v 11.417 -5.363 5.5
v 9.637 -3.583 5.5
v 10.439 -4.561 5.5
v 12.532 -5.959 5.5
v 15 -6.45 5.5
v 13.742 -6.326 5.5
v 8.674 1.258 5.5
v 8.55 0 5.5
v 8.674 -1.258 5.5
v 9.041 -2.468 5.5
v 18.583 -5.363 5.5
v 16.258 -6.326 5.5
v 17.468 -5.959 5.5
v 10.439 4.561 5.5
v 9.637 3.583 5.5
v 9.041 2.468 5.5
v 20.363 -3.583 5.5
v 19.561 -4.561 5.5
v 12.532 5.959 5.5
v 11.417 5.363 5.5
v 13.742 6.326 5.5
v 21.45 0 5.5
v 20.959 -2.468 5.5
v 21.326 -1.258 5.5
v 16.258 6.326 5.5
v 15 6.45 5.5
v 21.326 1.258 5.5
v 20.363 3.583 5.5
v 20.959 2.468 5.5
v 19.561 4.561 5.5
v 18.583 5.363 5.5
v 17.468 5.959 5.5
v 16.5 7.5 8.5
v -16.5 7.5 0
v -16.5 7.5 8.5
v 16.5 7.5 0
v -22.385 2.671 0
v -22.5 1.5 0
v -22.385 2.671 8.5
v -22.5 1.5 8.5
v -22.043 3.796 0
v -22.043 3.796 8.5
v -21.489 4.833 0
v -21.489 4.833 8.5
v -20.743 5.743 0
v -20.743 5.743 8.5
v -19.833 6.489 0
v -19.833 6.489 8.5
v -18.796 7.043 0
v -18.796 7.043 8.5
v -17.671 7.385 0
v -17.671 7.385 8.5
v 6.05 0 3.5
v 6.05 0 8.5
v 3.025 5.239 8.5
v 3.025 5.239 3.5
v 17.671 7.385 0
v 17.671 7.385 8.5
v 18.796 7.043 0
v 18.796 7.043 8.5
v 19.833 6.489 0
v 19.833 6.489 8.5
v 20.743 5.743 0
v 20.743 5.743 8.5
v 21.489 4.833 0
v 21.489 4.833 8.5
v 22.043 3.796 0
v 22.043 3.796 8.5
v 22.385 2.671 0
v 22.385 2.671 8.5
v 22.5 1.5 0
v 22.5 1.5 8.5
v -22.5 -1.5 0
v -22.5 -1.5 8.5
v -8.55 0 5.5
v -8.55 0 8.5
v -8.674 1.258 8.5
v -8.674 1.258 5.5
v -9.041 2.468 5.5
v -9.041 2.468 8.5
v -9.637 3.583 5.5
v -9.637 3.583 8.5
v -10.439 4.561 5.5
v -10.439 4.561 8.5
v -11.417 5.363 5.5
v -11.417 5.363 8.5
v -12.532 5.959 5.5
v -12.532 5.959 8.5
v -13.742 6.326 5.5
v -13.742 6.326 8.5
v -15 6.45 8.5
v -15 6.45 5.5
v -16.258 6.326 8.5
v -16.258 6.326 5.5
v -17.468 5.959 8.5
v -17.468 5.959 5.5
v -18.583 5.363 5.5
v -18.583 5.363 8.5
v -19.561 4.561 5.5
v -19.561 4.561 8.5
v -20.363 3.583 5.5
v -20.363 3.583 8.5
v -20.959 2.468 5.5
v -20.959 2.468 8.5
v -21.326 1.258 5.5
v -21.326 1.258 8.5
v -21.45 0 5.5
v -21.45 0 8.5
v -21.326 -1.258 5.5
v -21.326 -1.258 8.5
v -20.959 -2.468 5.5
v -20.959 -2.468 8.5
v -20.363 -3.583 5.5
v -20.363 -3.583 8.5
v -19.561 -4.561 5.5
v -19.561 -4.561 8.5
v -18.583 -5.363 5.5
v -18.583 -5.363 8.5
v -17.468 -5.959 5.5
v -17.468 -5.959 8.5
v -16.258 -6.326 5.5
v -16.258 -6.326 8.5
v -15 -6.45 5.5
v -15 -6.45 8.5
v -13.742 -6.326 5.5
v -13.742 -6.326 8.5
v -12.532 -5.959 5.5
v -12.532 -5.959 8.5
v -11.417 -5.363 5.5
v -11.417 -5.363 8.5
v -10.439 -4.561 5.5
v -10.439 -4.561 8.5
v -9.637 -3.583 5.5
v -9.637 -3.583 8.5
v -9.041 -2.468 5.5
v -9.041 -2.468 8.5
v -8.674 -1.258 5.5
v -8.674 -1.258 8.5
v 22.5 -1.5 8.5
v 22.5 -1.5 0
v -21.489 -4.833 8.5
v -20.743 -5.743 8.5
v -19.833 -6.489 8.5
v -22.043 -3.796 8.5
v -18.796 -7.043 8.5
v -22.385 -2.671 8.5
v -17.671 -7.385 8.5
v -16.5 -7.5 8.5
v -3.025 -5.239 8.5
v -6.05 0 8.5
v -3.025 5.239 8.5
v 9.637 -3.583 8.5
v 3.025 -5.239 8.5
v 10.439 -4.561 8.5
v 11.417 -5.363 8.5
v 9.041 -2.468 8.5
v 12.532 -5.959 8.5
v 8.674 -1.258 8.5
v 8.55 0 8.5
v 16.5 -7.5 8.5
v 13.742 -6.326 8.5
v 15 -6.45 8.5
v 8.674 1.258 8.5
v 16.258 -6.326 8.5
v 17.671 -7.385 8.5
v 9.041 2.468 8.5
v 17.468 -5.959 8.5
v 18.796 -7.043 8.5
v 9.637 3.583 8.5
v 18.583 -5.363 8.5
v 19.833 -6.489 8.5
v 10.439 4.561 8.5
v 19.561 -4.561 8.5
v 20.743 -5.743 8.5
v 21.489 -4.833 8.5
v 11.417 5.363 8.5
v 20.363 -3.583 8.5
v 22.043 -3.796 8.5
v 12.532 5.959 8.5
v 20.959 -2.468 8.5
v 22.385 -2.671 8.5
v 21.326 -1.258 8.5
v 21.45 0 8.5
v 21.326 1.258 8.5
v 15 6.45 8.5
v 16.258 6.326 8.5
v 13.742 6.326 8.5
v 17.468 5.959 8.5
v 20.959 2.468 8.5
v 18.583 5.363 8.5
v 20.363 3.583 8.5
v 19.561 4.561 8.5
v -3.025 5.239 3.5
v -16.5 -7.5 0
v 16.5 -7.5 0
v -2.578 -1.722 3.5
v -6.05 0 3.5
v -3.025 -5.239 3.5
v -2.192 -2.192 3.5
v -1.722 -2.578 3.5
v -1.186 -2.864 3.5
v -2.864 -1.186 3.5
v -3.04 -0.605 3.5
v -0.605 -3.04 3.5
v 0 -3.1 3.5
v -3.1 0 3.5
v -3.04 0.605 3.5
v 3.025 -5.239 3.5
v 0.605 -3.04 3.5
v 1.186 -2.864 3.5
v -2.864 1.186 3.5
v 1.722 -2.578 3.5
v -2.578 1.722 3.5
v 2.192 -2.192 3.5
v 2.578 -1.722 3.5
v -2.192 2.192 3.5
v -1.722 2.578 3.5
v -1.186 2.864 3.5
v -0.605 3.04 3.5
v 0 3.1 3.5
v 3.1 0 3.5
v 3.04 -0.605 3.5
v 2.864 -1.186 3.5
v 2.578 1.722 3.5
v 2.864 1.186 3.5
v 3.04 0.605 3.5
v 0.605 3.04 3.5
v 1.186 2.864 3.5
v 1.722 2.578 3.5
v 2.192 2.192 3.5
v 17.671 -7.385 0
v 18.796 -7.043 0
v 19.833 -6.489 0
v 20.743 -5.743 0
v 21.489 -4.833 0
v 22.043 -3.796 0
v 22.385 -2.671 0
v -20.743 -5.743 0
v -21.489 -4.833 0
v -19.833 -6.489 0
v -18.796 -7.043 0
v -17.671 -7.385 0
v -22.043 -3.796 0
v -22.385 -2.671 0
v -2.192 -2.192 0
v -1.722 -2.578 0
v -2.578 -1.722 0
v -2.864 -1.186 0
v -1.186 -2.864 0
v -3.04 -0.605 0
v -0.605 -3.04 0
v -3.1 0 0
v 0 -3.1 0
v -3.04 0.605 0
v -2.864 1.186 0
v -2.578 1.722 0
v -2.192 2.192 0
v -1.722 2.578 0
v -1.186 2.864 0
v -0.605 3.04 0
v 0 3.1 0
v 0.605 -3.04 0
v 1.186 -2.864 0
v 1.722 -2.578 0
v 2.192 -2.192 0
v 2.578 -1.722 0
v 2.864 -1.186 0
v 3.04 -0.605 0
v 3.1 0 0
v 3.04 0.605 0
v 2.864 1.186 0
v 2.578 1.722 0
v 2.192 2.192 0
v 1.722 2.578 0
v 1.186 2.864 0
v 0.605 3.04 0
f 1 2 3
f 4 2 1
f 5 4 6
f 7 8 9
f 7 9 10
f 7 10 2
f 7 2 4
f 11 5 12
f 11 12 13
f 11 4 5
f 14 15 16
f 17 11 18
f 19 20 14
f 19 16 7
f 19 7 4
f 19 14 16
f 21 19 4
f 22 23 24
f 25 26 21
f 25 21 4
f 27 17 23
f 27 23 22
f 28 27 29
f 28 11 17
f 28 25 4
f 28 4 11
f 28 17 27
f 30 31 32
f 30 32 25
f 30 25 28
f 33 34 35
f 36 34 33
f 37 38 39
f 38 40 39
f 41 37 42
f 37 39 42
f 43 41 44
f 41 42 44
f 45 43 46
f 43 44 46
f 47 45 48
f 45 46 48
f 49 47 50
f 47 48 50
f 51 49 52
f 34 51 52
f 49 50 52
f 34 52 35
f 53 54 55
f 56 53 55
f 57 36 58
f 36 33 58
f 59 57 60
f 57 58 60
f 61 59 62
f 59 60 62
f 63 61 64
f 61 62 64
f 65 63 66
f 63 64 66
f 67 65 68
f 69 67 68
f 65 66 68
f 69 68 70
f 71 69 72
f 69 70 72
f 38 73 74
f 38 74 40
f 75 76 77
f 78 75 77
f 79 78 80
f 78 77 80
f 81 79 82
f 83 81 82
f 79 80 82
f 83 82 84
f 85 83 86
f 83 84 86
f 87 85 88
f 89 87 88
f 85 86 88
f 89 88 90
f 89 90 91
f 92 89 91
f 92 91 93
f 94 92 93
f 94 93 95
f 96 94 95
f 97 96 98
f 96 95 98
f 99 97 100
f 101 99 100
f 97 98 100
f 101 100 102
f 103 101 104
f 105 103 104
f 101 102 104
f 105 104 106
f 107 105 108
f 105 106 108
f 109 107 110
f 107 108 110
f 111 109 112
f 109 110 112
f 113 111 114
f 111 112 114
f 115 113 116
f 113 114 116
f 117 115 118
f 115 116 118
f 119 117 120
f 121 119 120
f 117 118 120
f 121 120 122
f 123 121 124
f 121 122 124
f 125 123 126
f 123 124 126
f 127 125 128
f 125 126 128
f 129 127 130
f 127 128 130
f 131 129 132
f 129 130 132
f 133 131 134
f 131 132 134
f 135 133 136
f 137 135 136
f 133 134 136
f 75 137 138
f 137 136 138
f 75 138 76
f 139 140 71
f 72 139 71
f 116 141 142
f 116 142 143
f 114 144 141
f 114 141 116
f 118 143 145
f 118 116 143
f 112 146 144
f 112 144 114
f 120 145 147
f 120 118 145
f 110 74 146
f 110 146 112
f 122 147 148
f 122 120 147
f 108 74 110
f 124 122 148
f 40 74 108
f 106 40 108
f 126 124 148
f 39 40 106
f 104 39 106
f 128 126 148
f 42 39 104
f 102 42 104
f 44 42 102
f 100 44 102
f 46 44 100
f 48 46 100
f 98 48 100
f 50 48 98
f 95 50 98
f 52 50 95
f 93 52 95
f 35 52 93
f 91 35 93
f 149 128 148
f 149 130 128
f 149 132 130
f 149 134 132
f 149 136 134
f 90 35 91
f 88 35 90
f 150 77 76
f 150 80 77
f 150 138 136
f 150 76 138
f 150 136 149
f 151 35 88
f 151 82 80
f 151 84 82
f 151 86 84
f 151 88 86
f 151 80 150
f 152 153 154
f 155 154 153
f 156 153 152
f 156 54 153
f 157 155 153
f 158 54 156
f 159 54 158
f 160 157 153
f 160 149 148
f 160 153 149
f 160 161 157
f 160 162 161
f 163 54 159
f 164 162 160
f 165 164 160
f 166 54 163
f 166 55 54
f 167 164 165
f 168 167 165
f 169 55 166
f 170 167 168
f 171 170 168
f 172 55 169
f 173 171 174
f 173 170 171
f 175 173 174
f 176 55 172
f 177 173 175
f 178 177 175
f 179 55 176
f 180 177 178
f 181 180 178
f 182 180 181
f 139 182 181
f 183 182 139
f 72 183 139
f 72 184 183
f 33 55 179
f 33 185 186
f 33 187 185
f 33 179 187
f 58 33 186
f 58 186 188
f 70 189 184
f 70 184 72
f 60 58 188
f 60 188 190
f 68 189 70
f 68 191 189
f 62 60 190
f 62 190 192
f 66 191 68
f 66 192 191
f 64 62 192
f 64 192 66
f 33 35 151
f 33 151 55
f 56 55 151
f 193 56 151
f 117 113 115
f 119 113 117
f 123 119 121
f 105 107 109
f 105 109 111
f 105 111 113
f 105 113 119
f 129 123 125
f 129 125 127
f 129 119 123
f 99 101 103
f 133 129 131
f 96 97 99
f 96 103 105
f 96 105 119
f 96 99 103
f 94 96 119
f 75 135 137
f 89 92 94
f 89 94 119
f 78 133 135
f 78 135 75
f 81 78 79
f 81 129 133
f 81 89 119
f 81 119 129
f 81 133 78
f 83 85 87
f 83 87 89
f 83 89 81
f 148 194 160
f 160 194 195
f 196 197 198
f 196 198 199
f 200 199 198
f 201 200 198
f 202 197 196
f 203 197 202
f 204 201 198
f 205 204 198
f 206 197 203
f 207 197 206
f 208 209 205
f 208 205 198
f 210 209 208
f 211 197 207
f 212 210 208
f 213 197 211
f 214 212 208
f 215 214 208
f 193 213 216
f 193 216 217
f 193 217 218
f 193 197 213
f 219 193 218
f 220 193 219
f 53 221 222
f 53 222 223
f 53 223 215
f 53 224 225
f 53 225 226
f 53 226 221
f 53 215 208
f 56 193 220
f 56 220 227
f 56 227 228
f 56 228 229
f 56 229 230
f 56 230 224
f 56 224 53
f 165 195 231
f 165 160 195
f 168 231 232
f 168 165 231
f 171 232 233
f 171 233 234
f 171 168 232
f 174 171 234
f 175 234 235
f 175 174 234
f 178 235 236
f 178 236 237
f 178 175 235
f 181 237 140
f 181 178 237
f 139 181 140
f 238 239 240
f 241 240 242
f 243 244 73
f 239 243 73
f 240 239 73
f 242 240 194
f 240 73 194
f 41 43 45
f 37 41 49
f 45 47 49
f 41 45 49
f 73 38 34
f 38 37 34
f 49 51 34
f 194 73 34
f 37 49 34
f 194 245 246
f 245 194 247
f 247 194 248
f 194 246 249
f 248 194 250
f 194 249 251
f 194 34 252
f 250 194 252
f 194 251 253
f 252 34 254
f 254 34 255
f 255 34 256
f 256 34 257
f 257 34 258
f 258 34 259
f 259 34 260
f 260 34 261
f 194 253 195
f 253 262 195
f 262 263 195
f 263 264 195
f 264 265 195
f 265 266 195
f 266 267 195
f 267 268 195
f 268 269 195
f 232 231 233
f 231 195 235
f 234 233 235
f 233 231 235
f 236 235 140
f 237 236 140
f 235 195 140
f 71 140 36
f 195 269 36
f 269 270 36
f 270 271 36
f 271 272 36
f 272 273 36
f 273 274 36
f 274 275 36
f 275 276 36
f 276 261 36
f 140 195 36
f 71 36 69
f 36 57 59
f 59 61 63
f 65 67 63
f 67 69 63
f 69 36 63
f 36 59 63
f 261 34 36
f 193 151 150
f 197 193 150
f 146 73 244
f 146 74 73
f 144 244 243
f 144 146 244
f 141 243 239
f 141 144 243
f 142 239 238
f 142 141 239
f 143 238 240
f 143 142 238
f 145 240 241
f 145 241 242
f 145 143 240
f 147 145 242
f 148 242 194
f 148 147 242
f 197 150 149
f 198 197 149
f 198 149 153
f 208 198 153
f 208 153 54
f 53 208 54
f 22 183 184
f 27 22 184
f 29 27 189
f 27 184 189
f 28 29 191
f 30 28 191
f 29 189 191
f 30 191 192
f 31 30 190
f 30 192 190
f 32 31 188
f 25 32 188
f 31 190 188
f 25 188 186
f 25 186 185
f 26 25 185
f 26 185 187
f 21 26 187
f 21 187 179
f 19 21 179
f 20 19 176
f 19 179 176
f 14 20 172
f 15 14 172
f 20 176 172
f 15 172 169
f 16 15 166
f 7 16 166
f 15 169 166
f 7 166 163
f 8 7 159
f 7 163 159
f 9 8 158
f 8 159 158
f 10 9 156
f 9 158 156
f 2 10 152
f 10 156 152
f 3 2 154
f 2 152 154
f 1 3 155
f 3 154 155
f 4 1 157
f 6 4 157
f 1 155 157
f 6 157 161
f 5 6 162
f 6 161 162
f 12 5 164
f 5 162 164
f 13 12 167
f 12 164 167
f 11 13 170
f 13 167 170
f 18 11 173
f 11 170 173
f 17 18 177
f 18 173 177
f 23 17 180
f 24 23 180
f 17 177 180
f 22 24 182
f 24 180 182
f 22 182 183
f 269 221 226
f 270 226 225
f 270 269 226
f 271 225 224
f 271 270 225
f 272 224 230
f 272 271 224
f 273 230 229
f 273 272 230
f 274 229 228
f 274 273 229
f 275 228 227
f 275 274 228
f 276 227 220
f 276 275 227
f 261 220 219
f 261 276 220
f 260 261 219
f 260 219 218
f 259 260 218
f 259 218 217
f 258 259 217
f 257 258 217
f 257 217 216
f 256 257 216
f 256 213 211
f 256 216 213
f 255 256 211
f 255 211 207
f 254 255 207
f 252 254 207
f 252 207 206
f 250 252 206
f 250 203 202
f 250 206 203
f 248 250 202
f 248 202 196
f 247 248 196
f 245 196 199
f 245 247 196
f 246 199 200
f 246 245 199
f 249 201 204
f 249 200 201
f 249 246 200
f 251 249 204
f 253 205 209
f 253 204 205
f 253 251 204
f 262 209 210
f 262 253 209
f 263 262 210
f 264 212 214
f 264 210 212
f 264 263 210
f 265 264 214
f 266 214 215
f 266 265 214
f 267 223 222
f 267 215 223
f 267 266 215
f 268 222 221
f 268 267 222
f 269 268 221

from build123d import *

# Parameters (mm, degrees)
SKETCH_W        = 45
SKETCH_H        = 15
SKETCH_R        = 3.1
PAD_DEPTH       = 8.5
POCKET_DEPTH    = 5
SKETCH002_R     = 6.45
POCKET001_DEPTH = 3
FILLET_R        = 6


with BuildPart() as part:
    # Sketch → Pad (new body)
    with BuildSketch(Plane.XY):
        Rectangle(SKETCH_W, SKETCH_H)
        Circle(SKETCH_R, mode=Mode.SUBTRACT)
    extrude(amount=PAD_DEPTH)

    # Sketch001 → Pocket (cut)
    with BuildSketch(Plane.XY.offset(8.5)):
        Polygon((3.025, -5.239454), (6.05, 0), (3.025, 5.239454), (-3.025, 5.239454), (-6.05, 0), (-3.025, -5.239454), align=None)
    extrude(amount=-POCKET_DEPTH, mode=Mode.SUBTRACT)

    # Sketch002 → Pocket001 (cut)
    with BuildSketch(Plane.XY.offset(8.5)):
        with Locations((15, 0)):
            Circle(SKETCH002_R)
        with Locations((-15, 0)):
            Circle(SKETCH002_R)
    extrude(amount=-POCKET001_DEPTH, mode=Mode.SUBTRACT)

    # Fillet
    fillet_edges = [part.edges().sort_by_distance(p)[0] for p in [
        (-22.5, -7.5, 4.25),
        (-22.5, 7.5, 4.25),
        (22.5, 7.5, 4.25),
        (22.5, -7.5, 4.25),
    ]]
    fillet(fillet_edges, radius=FILLET_R)


solid = part.part
